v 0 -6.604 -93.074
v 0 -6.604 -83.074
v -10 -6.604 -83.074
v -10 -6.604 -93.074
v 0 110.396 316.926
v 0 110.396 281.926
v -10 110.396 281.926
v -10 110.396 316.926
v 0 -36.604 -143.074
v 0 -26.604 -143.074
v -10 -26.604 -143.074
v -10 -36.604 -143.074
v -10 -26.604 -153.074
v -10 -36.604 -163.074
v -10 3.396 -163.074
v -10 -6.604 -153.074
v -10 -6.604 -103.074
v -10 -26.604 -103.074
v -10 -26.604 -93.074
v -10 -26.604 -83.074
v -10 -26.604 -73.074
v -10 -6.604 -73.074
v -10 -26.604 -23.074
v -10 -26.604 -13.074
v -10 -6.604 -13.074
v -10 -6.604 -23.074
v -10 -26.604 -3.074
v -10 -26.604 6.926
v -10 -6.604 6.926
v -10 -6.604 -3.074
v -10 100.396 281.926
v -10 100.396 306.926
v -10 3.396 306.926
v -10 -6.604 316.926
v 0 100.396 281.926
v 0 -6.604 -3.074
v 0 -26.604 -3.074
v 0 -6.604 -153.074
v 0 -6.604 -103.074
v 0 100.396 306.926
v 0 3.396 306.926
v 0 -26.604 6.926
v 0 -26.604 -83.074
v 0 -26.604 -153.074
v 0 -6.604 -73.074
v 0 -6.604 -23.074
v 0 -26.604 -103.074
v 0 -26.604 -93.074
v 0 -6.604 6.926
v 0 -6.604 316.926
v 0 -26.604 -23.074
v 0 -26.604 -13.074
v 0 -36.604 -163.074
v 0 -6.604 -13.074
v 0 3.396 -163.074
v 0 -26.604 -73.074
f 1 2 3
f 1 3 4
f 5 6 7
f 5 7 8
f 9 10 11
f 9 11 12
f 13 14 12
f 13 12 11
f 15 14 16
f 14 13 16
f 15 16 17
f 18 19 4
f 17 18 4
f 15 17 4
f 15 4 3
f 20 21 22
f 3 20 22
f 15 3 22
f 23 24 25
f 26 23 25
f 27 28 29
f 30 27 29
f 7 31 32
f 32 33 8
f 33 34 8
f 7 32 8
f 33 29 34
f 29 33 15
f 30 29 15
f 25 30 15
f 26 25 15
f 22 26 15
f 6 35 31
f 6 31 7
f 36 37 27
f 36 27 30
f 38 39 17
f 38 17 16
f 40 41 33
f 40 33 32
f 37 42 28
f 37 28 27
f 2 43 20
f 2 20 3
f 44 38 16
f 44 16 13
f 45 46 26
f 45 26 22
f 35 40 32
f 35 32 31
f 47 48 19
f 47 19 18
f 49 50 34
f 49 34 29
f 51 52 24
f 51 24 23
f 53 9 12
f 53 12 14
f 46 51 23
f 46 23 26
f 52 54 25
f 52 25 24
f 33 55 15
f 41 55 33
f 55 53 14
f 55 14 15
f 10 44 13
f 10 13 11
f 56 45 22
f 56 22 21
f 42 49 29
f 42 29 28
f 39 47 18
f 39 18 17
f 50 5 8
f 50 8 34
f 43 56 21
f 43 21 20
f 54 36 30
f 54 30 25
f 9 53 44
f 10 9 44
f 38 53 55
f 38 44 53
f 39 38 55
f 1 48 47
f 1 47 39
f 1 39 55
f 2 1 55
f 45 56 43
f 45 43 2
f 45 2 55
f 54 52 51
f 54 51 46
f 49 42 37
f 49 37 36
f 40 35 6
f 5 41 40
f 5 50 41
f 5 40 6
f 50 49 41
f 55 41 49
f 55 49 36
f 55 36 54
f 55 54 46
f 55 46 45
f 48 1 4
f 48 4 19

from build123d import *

# Parameters (mm, degrees)
F1_DEPTH = 10


with BuildPart() as f1:
    # F0 (on Right) → F1 (new body)
    with BuildSketch(Plane.YZ):
        Polygon((110.396181, 316.925998), (-6.603819, 316.925998), (-6.603819, 6.925998), (-26.603819, 6.925998), (-26.603819, -3.074002), (-6.603819, -3.074002), (-6.603819, -13.074002), (-26.603819, -13.074002), (-26.603819, -23.074002), (-6.603819, -23.074002), (-6.603819, -73.074002), (-26.603819, -73.074002), (-26.603819, -83.074002), (-6.603819, -83.074002), (-6.603819, -93.074002), (-26.603819, -93.074002), (-26.603819, -103.074002), (-6.603819, -103.074002), (-6.603819, -153.074002), (-26.603819, -153.074002), (-26.603819, -143.074002), (-36.603819, -143.074002), (-36.603819, -163.074002), (3.396181, -163.074002), (3.396181, 306.925998), (100.396181, 306.925998), (100.396181, 281.925998), (110.396181, 281.925998), align=None)
    extrude(amount=-F1_DEPTH)


solid = f1.part
